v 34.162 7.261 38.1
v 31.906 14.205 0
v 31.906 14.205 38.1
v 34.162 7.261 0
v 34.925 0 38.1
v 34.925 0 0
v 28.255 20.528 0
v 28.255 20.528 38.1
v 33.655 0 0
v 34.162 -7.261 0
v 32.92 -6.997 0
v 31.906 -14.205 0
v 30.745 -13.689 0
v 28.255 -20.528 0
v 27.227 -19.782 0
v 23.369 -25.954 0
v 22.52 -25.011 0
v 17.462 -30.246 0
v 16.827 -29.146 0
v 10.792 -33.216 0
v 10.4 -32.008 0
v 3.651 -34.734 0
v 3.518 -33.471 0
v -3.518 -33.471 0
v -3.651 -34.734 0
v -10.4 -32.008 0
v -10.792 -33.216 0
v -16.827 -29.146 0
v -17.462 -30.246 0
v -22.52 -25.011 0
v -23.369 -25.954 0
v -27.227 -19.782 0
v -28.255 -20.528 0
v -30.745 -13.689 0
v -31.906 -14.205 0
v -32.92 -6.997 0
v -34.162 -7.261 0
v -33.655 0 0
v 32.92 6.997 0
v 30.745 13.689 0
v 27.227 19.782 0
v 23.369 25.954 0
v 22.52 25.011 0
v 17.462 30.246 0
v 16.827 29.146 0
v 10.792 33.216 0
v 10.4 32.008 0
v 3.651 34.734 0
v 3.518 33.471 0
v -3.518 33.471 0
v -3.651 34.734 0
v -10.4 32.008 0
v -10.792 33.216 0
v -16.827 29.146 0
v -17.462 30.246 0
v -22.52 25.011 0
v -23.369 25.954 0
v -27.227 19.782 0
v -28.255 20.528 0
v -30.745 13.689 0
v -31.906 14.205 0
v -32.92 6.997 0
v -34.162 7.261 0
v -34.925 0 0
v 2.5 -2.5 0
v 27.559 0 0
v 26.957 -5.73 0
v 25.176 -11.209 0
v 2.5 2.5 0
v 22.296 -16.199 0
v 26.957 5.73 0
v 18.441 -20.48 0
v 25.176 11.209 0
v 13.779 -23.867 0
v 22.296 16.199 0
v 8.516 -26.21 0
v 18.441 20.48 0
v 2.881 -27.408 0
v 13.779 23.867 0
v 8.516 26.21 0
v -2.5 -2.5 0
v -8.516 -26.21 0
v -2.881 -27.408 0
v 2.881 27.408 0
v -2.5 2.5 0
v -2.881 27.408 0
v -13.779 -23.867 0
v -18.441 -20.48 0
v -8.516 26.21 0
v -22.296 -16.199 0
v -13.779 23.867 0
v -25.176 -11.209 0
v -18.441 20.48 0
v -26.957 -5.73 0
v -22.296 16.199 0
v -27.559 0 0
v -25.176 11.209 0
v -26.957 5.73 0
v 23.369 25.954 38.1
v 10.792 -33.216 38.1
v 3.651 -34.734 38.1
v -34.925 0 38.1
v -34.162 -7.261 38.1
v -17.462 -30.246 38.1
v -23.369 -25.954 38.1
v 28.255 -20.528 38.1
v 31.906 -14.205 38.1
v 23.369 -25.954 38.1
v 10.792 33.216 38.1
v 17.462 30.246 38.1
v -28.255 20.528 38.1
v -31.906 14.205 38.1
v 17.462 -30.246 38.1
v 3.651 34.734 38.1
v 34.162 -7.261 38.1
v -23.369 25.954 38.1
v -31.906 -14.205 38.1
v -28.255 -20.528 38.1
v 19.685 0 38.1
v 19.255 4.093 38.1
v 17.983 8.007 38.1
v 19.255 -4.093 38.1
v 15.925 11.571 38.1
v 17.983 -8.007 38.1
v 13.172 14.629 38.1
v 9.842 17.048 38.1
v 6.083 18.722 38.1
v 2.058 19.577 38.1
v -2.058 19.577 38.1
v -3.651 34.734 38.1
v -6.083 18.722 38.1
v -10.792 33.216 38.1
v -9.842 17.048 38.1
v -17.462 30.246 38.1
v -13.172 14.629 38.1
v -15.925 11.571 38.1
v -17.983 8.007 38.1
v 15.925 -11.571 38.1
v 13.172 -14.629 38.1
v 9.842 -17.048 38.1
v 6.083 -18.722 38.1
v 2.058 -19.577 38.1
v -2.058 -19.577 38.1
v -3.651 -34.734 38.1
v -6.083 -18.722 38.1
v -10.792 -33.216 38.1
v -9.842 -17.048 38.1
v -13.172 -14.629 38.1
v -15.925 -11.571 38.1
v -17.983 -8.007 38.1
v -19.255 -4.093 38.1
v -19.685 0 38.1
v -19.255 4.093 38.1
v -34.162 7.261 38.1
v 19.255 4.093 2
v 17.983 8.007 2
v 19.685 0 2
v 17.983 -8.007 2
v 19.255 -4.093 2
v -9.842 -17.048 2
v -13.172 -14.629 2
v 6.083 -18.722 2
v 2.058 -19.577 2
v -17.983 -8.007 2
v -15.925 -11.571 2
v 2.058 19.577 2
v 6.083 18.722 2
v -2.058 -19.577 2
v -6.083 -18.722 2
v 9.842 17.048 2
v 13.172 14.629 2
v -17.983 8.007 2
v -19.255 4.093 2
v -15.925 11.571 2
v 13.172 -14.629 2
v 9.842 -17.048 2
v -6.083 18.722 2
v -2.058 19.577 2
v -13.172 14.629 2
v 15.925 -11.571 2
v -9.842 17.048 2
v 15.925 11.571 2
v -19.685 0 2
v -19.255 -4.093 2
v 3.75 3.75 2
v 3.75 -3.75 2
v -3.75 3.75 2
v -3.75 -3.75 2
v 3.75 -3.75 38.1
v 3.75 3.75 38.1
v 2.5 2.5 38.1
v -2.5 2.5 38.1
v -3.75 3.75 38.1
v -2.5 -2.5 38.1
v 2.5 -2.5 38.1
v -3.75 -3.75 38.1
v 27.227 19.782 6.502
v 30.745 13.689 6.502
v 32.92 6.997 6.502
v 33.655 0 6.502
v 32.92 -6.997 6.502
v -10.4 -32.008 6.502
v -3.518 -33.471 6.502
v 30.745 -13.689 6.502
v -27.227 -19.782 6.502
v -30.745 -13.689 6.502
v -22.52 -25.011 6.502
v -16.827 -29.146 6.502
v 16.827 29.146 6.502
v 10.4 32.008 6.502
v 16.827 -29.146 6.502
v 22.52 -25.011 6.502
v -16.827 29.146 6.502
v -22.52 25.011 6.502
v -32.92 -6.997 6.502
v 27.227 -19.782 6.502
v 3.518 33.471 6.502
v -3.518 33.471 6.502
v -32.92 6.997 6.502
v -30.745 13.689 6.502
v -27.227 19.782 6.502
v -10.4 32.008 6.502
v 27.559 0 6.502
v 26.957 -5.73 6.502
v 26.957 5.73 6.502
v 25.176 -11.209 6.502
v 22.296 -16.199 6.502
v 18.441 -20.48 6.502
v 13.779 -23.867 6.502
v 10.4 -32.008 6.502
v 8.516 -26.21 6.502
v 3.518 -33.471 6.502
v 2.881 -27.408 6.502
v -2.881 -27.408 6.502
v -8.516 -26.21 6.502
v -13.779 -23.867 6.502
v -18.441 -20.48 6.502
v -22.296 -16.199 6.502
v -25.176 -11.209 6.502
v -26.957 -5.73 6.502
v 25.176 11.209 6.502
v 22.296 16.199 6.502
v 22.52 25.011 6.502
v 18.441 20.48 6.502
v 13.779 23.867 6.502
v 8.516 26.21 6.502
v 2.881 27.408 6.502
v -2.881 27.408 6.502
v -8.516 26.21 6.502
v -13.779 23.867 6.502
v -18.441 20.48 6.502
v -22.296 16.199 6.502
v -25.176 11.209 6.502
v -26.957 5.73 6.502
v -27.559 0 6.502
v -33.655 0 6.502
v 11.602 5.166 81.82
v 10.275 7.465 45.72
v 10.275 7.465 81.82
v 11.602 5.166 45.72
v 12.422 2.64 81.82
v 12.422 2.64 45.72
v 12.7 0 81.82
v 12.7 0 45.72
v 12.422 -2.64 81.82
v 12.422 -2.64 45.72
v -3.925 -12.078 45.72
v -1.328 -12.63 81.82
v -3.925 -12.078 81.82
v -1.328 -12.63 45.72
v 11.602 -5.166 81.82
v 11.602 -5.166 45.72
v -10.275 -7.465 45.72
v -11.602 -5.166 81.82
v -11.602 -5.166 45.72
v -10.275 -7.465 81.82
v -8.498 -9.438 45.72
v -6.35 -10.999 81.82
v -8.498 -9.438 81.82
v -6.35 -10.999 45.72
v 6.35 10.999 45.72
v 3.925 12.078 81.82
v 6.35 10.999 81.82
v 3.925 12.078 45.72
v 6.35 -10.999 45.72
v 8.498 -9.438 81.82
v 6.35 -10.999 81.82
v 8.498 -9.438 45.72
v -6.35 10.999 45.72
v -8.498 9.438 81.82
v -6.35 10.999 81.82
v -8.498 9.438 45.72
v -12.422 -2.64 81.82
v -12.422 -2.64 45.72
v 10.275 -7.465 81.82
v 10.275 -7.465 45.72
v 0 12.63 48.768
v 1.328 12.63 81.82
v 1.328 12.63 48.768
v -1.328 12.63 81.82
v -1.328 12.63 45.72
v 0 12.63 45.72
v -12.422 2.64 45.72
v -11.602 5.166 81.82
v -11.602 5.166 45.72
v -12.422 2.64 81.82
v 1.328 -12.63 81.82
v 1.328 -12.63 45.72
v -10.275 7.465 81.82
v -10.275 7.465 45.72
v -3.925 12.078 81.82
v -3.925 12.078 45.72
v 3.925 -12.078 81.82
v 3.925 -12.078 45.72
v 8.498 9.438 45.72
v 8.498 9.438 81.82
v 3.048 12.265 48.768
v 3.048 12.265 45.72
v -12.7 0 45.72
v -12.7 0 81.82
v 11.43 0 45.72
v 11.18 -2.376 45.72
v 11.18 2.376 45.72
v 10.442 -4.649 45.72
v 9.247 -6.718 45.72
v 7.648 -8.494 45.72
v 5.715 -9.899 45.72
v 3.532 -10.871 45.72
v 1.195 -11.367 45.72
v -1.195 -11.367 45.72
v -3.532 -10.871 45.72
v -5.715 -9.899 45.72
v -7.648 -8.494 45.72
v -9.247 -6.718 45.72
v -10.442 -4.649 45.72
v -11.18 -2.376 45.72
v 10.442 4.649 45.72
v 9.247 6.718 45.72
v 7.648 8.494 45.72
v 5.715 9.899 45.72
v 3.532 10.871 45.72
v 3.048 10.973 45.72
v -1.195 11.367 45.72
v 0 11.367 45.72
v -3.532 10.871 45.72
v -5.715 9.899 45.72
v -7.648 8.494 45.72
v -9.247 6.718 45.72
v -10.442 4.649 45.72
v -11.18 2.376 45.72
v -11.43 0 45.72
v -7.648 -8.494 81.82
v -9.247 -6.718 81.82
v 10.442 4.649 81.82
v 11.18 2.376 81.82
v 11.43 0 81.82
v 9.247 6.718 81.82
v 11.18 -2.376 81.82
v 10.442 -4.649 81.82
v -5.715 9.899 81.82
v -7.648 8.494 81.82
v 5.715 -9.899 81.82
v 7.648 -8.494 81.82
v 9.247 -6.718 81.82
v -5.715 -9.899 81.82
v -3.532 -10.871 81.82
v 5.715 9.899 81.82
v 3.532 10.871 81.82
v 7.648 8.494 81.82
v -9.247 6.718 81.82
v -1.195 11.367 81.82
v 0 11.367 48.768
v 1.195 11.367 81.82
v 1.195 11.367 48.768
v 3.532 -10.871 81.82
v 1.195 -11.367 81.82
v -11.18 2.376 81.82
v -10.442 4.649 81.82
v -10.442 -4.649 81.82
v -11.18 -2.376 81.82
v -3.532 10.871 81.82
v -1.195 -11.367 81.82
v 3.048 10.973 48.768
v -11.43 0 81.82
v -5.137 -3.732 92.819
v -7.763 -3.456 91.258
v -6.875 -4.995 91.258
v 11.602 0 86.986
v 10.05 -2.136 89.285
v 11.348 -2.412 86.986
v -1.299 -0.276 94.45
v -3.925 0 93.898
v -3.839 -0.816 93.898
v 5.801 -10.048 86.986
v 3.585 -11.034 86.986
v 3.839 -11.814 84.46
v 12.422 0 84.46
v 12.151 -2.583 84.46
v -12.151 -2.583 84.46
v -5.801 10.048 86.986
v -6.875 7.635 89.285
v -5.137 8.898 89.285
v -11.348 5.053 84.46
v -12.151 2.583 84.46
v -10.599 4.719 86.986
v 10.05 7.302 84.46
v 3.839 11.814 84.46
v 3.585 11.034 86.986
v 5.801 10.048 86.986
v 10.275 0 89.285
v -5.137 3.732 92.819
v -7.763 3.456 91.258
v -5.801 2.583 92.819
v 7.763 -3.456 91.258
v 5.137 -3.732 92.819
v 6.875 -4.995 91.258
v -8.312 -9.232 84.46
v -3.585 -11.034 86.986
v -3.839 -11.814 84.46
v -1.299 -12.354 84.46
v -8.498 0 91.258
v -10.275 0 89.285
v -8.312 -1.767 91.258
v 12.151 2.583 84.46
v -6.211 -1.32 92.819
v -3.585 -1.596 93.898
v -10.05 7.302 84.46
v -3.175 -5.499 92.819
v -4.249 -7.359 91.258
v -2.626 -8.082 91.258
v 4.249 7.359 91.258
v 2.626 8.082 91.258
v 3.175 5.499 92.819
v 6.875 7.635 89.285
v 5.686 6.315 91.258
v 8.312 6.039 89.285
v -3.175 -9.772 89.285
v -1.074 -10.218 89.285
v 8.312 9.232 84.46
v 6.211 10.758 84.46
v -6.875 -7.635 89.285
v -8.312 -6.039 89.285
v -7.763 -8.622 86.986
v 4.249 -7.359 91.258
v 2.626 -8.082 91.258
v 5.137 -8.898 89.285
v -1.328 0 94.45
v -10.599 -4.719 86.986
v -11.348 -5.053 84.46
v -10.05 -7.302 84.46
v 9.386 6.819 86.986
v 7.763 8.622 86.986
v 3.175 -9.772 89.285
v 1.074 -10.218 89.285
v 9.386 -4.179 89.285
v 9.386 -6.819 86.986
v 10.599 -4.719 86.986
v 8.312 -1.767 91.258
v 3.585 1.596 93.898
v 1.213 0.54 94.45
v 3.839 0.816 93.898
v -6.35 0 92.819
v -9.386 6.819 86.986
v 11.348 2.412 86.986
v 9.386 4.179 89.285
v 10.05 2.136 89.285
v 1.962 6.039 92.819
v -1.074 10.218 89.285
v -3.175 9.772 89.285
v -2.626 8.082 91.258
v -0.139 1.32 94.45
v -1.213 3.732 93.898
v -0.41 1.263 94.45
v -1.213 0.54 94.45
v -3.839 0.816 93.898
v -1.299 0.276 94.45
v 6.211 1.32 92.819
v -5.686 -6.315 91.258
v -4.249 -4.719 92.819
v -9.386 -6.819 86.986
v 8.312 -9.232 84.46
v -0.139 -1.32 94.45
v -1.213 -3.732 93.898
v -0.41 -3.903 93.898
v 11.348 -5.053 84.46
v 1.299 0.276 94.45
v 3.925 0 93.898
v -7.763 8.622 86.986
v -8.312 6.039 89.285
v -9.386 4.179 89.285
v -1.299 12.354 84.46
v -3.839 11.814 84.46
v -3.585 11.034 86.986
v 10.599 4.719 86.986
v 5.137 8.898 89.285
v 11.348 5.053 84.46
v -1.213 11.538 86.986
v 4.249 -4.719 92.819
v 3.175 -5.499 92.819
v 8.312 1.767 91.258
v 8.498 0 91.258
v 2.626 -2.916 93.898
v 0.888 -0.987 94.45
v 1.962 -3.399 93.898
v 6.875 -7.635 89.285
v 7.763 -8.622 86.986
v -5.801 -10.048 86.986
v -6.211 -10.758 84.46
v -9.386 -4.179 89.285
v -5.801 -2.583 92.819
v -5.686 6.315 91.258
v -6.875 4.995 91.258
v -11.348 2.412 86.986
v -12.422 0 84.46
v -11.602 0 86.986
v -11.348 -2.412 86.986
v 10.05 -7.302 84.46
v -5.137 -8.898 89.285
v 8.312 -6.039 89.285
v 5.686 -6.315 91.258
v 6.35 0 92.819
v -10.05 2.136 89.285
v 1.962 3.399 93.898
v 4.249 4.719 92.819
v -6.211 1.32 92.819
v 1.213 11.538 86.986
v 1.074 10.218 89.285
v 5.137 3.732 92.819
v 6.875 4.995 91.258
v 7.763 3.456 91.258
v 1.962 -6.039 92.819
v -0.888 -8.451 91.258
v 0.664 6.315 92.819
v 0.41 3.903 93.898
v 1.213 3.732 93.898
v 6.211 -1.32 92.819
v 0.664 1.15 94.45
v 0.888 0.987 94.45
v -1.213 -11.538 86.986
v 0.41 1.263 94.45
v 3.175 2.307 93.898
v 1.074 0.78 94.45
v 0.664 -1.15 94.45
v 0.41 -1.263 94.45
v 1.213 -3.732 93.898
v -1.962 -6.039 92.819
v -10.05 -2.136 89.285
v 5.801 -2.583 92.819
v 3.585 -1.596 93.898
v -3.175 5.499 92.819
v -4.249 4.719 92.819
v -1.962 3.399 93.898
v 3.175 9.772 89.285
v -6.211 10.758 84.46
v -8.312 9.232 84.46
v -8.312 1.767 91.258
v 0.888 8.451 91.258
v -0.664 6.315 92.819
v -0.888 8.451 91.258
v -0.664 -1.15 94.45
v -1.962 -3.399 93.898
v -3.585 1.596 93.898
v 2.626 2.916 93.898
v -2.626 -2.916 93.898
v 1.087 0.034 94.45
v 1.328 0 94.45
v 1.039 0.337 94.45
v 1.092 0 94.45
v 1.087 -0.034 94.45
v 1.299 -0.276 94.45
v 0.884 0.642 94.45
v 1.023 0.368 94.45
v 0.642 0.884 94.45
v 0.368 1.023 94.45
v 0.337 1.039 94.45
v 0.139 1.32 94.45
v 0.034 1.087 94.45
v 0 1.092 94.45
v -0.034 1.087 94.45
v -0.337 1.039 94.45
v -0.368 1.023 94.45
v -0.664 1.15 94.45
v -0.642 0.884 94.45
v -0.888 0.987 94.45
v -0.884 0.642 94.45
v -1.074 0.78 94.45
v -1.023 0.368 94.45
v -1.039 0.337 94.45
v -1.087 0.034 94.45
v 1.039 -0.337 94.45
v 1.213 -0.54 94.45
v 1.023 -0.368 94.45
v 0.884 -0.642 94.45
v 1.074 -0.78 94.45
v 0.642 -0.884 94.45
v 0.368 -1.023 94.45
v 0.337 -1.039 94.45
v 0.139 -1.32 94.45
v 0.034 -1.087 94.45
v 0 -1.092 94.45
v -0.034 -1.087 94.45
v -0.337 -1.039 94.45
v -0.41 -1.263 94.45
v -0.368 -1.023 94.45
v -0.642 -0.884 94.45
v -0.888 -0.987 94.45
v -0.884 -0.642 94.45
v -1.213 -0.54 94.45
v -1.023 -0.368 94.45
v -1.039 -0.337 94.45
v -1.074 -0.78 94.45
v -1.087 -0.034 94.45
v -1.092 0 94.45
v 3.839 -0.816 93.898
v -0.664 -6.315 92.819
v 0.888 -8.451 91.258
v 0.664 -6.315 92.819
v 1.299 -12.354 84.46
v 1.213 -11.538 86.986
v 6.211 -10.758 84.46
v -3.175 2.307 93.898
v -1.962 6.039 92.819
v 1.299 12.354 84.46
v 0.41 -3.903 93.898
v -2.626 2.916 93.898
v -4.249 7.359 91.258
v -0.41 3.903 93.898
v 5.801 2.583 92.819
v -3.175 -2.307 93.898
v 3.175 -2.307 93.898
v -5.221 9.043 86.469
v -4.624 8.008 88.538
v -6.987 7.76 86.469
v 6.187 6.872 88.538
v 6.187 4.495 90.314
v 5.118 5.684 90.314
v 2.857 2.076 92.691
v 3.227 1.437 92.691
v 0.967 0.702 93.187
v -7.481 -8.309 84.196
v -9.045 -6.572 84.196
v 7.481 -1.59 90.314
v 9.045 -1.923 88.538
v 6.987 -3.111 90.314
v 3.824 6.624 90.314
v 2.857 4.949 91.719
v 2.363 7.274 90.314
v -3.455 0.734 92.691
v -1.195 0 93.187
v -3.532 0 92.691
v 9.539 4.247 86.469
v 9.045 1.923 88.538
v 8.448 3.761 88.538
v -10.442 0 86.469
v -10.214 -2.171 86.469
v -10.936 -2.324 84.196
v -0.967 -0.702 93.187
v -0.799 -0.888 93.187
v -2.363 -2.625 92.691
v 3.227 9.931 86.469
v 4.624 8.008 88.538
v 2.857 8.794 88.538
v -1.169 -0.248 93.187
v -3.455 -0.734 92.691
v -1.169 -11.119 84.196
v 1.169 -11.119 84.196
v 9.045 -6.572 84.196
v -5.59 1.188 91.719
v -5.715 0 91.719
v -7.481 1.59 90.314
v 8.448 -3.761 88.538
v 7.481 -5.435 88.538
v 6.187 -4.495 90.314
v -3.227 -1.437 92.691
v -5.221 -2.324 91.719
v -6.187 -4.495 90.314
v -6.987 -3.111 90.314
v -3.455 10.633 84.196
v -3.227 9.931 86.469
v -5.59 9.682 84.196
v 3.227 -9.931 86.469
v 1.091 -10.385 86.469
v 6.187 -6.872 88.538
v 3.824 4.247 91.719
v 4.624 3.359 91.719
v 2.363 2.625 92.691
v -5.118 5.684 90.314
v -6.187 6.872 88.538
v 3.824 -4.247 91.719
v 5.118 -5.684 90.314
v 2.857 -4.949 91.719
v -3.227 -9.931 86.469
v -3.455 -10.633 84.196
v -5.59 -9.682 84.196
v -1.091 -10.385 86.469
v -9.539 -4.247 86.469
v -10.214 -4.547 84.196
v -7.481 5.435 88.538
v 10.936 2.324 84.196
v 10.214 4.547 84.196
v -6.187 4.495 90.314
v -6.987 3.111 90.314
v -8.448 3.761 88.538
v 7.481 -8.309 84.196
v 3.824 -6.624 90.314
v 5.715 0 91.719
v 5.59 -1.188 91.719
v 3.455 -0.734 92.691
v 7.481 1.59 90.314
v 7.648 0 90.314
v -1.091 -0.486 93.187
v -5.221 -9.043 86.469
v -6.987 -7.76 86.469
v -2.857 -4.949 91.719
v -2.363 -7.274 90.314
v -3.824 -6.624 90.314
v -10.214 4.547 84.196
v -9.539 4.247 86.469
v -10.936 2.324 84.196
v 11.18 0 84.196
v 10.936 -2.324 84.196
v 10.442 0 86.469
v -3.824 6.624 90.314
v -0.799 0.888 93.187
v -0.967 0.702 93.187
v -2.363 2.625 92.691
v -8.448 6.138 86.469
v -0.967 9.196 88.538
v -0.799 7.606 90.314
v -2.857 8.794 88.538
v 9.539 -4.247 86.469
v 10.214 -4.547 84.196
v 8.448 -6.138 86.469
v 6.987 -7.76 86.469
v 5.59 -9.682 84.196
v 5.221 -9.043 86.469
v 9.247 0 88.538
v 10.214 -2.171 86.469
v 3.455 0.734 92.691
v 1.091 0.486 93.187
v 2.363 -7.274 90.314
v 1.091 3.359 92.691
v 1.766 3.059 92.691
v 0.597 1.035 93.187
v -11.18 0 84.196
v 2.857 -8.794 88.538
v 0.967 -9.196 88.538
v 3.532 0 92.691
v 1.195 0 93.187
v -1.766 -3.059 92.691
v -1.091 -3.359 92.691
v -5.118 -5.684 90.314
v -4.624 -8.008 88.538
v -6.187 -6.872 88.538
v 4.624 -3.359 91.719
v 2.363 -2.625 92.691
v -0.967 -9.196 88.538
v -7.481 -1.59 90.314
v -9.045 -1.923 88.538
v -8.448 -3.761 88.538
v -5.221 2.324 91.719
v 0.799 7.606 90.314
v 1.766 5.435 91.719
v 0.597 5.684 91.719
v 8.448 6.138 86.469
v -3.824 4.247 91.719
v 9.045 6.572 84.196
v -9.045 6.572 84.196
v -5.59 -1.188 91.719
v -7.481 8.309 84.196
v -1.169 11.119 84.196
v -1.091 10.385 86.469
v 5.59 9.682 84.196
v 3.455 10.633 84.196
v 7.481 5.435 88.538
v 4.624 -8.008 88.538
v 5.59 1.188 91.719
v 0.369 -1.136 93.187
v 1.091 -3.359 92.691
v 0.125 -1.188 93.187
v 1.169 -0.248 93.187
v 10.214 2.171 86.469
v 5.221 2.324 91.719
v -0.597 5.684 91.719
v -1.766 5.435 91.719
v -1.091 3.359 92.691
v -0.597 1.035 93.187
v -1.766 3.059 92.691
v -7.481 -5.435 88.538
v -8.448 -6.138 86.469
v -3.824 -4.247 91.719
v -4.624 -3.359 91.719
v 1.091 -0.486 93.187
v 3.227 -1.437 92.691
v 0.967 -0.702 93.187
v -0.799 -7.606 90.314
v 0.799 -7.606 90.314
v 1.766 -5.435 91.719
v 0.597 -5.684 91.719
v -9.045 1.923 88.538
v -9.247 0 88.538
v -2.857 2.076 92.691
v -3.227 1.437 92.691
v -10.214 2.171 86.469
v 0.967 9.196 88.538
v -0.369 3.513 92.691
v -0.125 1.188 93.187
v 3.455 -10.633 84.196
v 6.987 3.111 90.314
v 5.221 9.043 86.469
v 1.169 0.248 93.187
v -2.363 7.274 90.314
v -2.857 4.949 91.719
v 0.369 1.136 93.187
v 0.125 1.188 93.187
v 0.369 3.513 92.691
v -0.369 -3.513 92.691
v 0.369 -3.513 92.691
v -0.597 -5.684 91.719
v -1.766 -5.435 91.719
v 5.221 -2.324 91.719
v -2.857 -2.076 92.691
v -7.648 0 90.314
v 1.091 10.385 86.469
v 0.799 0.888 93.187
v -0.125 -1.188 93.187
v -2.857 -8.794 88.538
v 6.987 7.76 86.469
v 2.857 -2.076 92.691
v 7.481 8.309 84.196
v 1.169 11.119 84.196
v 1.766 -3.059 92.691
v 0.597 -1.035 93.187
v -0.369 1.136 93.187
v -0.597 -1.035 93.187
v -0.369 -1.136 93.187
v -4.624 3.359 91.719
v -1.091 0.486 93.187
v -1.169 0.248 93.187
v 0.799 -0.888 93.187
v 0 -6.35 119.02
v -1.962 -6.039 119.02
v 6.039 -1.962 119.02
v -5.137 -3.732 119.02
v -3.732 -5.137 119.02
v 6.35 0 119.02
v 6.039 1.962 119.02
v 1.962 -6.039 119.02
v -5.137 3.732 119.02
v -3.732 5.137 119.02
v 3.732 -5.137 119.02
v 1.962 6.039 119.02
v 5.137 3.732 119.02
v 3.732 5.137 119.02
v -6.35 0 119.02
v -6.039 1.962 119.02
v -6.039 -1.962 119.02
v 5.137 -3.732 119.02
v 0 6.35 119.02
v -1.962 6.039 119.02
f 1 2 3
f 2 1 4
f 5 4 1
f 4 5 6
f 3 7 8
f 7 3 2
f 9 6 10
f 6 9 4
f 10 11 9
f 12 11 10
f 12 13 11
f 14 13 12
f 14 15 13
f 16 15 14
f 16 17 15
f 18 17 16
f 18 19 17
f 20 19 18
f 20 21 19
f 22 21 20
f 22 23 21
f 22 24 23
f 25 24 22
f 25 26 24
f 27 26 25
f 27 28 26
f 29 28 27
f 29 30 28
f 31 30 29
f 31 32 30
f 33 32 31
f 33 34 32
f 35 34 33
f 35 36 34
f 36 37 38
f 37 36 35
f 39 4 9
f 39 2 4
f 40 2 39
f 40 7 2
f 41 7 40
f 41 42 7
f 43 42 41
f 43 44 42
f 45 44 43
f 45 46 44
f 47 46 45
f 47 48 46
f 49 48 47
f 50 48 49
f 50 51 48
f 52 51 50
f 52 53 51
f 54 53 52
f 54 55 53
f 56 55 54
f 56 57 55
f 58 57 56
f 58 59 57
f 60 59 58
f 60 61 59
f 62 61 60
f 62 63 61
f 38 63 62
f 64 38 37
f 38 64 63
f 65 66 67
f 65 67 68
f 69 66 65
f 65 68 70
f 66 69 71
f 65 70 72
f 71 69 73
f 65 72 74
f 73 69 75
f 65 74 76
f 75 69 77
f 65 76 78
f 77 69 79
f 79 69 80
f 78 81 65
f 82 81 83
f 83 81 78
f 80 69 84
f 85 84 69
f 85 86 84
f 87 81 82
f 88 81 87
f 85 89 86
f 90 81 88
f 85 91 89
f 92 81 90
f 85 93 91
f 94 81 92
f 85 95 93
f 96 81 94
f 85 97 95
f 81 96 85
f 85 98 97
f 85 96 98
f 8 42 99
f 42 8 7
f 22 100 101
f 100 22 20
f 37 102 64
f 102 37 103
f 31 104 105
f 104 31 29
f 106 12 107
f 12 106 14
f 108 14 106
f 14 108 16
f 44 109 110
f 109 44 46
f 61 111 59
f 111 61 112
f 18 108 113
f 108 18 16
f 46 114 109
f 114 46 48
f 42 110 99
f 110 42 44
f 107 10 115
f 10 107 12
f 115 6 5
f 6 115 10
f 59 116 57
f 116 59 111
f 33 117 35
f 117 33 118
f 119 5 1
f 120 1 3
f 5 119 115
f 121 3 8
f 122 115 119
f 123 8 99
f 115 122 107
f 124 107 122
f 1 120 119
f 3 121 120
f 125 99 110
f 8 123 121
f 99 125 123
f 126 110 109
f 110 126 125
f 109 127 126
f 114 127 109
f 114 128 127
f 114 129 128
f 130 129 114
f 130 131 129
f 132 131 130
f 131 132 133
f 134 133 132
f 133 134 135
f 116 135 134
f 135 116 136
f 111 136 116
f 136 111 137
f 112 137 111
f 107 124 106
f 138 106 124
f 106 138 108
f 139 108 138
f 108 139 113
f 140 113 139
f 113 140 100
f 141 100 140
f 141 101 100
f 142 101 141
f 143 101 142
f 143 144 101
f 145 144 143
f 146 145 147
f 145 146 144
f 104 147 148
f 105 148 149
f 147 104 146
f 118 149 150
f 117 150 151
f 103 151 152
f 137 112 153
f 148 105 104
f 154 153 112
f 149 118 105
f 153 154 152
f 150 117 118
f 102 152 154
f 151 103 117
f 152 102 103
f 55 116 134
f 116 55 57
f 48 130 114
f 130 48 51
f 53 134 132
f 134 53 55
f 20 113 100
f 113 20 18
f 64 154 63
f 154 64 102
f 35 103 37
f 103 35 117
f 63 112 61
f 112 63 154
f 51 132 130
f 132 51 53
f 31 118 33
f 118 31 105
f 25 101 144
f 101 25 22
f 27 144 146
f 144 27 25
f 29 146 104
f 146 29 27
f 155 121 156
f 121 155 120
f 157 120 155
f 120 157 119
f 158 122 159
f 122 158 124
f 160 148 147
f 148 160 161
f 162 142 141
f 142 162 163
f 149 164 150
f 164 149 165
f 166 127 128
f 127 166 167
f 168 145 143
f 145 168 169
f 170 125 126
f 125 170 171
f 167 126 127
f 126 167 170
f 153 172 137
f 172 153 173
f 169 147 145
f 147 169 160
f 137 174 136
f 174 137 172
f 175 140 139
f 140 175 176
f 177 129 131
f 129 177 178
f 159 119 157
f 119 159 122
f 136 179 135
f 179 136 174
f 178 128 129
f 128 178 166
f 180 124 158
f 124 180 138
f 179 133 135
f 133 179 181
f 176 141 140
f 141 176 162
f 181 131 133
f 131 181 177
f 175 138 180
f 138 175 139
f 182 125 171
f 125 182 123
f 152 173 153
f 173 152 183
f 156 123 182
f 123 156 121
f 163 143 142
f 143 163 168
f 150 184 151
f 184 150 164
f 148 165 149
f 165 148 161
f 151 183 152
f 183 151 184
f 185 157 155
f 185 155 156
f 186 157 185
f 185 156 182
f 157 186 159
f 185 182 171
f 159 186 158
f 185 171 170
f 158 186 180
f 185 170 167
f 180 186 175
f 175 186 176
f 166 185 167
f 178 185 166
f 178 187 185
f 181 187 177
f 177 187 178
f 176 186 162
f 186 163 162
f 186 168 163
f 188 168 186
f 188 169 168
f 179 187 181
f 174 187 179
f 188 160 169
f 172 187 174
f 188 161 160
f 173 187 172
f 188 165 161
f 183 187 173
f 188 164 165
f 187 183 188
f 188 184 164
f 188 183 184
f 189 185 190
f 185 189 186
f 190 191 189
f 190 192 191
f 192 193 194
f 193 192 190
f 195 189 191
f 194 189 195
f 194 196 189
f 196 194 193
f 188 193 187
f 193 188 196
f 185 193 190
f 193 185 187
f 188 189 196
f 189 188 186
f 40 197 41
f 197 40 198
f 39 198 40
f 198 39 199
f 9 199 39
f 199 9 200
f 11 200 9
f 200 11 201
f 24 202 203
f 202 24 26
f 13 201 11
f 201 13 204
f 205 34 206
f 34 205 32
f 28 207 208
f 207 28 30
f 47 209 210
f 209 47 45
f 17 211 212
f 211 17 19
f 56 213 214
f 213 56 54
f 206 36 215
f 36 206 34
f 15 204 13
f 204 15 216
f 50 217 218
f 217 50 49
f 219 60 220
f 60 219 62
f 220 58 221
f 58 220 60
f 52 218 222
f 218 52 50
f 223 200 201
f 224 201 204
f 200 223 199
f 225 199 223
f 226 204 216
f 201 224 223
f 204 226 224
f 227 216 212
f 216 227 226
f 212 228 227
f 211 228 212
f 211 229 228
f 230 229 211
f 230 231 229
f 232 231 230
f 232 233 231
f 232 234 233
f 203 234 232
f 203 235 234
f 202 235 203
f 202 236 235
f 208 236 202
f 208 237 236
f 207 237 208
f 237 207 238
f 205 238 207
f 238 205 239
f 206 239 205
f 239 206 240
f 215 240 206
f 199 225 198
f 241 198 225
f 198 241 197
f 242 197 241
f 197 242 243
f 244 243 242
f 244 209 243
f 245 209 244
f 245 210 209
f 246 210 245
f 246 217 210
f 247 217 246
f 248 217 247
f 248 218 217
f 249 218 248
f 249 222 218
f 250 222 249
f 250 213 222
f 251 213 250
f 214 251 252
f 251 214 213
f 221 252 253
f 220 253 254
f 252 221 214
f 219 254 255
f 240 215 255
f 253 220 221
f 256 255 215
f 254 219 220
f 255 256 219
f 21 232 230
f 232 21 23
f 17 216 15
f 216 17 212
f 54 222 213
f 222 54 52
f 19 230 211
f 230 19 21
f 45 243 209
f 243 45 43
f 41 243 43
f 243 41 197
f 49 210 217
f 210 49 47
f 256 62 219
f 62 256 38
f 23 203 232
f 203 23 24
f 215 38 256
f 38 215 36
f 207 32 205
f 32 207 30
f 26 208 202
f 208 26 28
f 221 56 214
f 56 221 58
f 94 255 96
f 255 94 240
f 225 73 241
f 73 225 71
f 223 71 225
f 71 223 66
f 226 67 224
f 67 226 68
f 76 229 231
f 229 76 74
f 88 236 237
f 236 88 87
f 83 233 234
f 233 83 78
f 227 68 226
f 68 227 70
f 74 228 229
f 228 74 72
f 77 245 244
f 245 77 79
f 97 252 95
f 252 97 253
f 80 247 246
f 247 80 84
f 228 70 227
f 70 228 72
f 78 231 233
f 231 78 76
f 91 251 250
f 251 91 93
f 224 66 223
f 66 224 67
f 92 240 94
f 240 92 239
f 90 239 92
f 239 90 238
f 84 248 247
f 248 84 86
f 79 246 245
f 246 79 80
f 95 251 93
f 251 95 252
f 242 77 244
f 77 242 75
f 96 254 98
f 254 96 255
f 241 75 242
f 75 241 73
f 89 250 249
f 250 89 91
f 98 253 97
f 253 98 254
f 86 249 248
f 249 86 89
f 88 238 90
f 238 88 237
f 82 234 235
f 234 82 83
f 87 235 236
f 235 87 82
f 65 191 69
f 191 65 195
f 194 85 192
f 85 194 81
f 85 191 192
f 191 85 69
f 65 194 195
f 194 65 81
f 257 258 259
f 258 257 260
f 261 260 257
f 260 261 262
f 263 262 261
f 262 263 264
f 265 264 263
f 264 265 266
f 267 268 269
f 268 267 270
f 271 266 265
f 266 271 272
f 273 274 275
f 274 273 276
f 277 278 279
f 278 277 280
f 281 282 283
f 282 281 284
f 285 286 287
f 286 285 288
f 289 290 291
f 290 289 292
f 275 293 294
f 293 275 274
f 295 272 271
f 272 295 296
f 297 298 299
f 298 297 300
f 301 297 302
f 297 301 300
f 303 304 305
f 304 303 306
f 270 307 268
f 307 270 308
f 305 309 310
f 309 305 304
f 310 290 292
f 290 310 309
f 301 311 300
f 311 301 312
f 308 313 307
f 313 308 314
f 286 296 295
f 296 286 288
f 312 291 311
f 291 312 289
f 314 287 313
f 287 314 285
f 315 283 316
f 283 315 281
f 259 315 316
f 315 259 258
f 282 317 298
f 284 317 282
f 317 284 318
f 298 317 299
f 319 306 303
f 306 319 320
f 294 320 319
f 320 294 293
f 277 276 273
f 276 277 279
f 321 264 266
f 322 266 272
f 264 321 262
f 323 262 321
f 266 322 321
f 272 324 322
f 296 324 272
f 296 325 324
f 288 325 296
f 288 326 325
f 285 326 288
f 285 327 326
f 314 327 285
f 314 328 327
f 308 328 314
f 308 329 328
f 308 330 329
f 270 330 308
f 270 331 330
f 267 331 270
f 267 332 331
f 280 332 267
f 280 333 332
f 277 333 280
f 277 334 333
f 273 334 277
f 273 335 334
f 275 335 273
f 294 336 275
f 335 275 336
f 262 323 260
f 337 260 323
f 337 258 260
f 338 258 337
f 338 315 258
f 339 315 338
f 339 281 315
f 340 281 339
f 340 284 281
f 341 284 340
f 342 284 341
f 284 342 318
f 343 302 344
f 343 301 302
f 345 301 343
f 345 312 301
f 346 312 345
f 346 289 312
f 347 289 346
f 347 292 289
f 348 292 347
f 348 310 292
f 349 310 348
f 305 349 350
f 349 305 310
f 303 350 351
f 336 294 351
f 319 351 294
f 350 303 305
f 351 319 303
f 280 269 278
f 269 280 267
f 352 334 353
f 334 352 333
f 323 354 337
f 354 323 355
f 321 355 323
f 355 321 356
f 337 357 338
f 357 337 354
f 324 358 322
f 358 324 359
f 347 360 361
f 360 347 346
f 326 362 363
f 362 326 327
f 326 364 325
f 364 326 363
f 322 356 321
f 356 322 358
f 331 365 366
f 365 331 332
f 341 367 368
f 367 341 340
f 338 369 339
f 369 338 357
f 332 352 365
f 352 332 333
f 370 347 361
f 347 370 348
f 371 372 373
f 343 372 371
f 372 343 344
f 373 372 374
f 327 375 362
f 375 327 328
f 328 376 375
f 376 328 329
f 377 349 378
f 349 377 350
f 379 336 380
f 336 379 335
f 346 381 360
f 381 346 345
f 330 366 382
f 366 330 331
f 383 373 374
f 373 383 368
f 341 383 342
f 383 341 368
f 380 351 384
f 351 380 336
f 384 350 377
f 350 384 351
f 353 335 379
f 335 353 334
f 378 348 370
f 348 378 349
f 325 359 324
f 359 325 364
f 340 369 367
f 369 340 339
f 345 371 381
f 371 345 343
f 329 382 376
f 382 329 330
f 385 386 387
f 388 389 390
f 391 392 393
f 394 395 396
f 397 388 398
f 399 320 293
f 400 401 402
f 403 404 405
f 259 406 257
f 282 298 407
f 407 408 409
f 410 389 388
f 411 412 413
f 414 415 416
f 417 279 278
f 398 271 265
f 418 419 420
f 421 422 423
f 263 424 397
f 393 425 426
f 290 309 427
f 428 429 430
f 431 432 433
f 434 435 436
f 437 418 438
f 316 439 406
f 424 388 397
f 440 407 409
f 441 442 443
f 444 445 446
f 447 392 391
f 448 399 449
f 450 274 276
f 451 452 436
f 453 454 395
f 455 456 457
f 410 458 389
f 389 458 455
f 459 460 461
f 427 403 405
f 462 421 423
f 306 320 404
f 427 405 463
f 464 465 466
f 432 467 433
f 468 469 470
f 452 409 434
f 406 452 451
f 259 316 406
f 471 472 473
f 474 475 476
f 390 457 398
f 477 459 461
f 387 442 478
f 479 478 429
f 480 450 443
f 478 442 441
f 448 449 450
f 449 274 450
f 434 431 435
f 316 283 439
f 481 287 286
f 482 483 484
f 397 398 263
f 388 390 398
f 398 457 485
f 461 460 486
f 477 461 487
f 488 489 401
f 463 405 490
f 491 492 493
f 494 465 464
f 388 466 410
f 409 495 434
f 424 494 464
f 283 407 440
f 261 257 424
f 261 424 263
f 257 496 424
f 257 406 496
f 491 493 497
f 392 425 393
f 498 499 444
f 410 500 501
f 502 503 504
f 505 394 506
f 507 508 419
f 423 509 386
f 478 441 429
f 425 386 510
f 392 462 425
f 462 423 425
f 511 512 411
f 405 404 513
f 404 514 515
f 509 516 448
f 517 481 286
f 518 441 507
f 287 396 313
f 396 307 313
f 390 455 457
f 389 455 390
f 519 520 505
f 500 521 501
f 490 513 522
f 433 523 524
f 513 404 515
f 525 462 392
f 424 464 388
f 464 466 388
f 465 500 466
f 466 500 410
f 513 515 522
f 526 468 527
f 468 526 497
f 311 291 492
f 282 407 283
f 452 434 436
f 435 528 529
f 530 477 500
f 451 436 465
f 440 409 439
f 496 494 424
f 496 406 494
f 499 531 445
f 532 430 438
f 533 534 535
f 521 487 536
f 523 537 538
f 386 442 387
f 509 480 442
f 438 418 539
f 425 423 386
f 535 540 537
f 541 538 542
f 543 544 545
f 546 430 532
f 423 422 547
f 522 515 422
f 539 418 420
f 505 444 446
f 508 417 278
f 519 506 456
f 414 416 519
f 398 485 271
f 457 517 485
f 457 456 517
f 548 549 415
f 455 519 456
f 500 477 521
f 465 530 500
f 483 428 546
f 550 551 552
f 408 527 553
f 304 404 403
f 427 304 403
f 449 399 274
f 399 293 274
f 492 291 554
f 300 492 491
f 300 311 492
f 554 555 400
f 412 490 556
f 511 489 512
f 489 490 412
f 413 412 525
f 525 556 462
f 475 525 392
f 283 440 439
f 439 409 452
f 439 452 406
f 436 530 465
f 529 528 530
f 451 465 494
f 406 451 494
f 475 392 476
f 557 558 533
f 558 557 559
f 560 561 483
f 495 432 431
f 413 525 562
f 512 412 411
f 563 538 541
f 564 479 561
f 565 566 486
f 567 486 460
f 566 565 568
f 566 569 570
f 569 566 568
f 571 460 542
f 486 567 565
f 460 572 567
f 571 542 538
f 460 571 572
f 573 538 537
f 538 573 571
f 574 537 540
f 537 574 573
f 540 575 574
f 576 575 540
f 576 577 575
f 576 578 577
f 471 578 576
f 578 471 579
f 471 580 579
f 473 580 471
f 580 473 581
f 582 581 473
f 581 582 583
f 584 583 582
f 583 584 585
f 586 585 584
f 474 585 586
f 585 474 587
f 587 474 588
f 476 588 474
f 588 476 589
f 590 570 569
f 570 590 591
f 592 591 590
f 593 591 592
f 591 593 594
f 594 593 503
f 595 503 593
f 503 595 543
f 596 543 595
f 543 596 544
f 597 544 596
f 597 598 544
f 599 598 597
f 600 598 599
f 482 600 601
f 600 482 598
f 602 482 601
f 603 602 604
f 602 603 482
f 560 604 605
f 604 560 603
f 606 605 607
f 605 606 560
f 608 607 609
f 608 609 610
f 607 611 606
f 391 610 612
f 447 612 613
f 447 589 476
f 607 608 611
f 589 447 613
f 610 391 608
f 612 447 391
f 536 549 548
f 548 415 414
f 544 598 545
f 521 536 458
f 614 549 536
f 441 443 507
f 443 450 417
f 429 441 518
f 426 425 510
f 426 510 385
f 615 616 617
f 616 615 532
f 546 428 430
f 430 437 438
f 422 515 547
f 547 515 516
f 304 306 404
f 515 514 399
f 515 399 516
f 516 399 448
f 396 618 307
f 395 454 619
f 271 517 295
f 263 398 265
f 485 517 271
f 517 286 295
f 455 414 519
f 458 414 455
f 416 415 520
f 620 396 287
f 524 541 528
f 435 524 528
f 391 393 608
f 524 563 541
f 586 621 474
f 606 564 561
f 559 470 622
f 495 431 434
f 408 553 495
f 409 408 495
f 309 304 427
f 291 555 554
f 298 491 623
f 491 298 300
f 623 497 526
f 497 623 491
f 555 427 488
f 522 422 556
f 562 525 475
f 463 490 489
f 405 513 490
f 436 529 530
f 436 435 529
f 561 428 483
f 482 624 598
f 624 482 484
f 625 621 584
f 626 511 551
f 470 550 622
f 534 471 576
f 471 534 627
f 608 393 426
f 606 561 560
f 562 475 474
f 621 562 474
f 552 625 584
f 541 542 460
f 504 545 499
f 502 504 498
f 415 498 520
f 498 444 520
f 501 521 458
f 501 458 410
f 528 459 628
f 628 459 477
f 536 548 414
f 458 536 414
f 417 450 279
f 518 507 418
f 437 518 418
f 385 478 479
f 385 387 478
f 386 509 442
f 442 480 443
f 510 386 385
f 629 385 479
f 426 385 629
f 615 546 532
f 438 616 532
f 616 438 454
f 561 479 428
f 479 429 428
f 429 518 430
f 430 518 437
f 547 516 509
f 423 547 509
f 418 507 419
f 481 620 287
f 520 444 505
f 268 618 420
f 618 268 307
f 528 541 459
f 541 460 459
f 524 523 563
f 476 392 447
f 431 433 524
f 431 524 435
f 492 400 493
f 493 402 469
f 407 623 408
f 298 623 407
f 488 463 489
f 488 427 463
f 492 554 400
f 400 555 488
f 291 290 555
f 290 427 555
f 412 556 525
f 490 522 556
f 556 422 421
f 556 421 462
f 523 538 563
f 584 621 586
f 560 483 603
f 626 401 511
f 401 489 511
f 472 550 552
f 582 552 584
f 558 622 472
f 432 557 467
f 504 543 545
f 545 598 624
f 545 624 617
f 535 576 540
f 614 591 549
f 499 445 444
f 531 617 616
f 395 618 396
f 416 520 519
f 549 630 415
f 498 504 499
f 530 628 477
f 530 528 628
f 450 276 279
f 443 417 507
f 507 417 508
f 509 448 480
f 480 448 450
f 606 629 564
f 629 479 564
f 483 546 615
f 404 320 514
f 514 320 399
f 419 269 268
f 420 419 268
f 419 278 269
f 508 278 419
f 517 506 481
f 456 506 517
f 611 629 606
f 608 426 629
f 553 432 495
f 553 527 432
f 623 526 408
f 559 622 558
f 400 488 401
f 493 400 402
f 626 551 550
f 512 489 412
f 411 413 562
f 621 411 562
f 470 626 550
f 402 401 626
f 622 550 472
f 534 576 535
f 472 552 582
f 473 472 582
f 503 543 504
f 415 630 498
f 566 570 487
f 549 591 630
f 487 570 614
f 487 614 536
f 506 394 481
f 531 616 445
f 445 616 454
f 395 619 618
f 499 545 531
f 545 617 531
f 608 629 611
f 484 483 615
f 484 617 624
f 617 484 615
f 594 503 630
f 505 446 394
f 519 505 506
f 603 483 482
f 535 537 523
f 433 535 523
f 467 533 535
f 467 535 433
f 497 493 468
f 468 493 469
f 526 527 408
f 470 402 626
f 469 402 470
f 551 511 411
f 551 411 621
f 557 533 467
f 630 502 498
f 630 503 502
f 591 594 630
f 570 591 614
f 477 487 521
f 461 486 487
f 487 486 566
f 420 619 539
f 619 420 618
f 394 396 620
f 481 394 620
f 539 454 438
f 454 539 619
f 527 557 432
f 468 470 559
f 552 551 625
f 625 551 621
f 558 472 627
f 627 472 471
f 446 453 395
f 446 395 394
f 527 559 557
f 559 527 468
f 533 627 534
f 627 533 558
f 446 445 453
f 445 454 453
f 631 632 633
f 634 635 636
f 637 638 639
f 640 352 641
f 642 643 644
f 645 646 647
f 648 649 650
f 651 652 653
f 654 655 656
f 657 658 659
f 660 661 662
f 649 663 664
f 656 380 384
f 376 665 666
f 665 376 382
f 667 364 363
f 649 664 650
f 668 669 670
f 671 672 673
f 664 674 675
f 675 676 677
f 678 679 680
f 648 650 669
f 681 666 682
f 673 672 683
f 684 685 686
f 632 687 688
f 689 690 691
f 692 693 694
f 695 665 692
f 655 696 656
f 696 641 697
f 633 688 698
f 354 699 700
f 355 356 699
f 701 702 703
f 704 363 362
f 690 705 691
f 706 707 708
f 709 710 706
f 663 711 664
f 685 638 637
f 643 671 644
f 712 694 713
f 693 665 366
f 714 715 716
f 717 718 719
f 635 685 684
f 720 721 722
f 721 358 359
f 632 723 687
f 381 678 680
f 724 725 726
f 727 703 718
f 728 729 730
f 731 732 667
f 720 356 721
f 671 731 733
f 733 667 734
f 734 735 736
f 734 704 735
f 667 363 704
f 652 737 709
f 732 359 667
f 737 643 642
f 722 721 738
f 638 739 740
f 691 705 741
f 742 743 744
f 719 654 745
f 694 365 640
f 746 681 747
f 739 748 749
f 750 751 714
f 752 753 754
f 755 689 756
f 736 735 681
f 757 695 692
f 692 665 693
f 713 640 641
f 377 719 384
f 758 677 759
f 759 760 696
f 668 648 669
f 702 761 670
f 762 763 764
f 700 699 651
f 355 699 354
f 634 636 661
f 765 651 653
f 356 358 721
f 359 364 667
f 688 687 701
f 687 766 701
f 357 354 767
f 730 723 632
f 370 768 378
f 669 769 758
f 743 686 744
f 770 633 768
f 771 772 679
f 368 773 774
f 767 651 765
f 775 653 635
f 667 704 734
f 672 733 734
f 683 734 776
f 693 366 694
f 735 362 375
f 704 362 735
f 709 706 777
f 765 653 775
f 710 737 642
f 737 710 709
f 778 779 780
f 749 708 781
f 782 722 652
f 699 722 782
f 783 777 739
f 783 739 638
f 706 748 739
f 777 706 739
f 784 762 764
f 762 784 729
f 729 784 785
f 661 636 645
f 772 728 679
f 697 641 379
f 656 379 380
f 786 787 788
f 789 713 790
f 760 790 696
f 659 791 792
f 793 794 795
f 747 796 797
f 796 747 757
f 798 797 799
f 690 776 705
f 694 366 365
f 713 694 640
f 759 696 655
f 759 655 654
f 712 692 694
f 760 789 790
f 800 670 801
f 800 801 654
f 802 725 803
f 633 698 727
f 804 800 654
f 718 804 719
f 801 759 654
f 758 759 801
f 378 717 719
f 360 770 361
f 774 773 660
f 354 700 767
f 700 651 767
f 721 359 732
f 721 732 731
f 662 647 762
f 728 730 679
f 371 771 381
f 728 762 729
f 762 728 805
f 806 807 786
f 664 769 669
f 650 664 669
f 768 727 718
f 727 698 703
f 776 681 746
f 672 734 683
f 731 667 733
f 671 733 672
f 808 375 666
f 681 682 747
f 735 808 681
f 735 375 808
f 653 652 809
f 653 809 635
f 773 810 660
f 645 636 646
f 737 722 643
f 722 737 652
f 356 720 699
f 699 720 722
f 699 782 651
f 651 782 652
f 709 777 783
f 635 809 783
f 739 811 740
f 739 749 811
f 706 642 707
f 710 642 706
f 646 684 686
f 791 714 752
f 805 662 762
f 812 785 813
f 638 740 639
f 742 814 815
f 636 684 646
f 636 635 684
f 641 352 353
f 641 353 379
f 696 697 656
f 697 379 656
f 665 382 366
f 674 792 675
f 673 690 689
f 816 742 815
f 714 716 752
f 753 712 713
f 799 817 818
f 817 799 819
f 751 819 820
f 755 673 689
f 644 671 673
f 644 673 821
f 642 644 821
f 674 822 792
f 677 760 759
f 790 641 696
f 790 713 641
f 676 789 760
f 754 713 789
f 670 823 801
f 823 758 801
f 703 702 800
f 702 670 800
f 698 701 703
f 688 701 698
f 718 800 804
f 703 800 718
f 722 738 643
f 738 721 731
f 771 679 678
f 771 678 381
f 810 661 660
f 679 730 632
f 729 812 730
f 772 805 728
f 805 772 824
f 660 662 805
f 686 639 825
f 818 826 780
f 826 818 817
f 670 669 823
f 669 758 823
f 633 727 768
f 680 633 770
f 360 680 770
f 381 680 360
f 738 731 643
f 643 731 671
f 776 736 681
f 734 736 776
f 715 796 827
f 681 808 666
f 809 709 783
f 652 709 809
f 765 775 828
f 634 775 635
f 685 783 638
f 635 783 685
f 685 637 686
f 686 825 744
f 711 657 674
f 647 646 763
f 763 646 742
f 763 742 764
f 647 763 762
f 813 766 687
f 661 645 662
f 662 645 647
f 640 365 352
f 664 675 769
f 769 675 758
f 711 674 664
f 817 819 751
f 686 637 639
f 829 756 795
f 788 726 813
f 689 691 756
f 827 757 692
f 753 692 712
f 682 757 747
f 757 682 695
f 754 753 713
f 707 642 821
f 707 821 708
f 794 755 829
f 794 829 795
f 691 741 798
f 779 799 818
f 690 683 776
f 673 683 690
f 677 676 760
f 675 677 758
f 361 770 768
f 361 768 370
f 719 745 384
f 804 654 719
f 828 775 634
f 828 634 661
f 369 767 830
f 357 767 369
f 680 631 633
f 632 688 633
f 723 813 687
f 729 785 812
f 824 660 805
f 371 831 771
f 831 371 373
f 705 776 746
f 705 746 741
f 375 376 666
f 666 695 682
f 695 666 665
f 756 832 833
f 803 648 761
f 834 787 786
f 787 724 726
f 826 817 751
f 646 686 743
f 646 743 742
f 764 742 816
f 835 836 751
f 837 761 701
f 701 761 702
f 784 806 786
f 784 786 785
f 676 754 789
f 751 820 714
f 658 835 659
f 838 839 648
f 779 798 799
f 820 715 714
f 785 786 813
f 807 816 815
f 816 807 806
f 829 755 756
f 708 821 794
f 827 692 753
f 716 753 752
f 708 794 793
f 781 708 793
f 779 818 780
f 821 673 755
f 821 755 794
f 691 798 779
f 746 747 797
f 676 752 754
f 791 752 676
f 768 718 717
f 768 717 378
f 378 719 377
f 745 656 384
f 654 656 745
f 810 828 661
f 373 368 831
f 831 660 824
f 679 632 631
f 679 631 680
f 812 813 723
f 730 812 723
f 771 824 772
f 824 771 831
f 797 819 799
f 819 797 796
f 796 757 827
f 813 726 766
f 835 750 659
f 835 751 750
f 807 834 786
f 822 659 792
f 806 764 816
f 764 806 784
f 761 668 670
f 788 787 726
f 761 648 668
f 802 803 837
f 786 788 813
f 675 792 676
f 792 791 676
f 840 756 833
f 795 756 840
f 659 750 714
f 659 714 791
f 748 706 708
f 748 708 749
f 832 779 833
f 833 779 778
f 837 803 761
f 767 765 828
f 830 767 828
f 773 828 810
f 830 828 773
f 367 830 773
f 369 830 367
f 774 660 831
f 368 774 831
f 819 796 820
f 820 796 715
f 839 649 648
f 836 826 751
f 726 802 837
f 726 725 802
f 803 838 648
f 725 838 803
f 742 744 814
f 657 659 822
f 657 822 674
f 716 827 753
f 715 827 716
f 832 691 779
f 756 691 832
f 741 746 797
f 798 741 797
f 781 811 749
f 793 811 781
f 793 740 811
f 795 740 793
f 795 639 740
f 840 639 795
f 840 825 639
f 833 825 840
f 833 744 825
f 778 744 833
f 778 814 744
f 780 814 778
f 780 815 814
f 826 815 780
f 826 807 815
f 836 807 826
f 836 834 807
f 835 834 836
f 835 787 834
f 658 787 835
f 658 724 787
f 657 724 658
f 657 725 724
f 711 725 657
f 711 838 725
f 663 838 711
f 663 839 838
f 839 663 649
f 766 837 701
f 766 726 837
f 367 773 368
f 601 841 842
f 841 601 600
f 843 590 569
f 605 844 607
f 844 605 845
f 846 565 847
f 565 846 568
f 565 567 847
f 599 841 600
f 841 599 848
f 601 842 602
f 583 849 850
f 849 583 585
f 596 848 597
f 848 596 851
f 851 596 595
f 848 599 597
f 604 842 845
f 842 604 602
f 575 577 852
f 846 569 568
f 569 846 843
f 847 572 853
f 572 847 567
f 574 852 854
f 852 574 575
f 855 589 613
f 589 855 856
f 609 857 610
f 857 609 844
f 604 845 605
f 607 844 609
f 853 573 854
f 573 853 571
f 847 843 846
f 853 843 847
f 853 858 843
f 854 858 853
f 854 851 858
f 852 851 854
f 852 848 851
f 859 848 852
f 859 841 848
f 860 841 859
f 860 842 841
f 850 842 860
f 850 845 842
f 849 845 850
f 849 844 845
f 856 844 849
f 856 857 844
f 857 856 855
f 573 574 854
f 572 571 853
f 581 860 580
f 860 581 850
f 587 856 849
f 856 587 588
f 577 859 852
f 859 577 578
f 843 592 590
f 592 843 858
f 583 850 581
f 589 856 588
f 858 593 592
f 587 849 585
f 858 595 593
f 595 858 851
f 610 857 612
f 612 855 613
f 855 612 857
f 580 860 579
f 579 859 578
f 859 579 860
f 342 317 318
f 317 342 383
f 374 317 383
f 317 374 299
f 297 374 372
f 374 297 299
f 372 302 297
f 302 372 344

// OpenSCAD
// file: shapes.scad
/*
 *  OpenSCAD Shapes Library (www.openscad.at)
 *  Copyright (C) 2009  Catarina Mota <clifford@clifford.at>
 *
 *  This program is free software; you can redistribute it and/or modify
 *  it under the terms of the GNU General Public License as published by
 *  the Free Software Foundation; either version 2 of the License, or
 *  (at your option) any later version.
 *
 *  This program is distributed in the hope that it will be useful,
 *  but WITHOUT ANY WARRANTY; without even the implied warranty of
 *  MERCHANTABILITY or FITNESS FOR A PARTICULAR PURPOSE.  See the
 *  GNU General Public License for more details.
 *
 *  You should have received a copy of the GNU General Public License
 *  along with this program; if not, write to the Free Software
 *  Foundation, Inc., 59 Temple Place, Suite 330, Boston, MA  02111-1307  USA
 *
*/


//box(width, height, depth);
//roundedBox(width, height, depth, factor);
//cone(height, radius);
//oval(width, height, depth);
//tube(height, radius, wall);
//ovalTube(width, height, depth, wall);
//hexagon(height, depth);
//octagon(height, depth);
//dodecagon(height, depth);
//hexagram(height, depth);
//rightTriangle(adjacent, opposite, depth);
//equiTriangle(side, depth);
//12ptStar(height, depth);

//----------------------

//roundedBox(120, 60, 3, 8);

//----------------------

module box(w,h,d) {
	scale ([w,h,d]) cube(1, true);
}

module roundedBox(w,h,d,f){
	difference(){
		box(w,h,d);
		translate([-w/2,h/2,0]) cube(w/(f/2),true);
		translate([w/2,h/2,0]) cube(w/(f/2),true);
		translate([-w/2,-h/2,0]) cube(w/(f/2),true);
		translate([w/2,-h/2,0]) cube(w/(f/2),true);
	}
	translate([-w/2+w/f,h/2-w/f,-d/2]) cylinder(d,w/f, w/f);
	translate([w/2-w/f,h/2-w/f,-d/2]) cylinder(d,w/f, w/f);
	translate([-w/2+w/f,-h/2+w/f,-d/2]) cylinder(d,w/f, w/f);
	translate([w/2-w/f,-h/2+w/f,-d/2]) cylinder(d,w/f, w/f);
}

module cone(height, radius) {
		cylinder(height, radius, 0);
}

module oval(w,h,d) {
	scale ([w/100, h/100, 1]) cylinder(d, 50, 50);
}

module tube(height, radius, wall) {
	difference(){
		cylinder(height, radius, radius);
		cylinder(height, radius-wall, radius-wall);
	}
}

module ovalTube(w,h,d,wall) {
	difference(){
		scale ([w/100, h/100, 1]) cylinder(d, 50, 50);
		scale ([w/100, h/100, 1]) cylinder(d, 50-wall, 50-wall);
	}
}

module hexagon(height, depth) {
	boxWidth=height/1.75;
		union(){
			box(boxWidth, height, depth);
			rotate([0,0,60]) box(boxWidth, height, depth);
			rotate([0,0,-60]) box(boxWidth, height, depth);
		}
}

module octagon(height, depth) {
	intersection(){
		box(height, height, depth);
		rotate([0,0,45]) box(height, height, depth);
	}
}

module dodecagon(height, depth) {
	intersection(){
		hexagon(height, depth);
		rotate([0,0,90]) hexagon(height, depth);
	}
}

module hexagram(height, depth) {
	boxWidth=height/1.75;
	intersection(){
		box(height, boxWidth, depth);
		rotate([0,0,60]) box(height, boxWidth, depth);
	}
	intersection(){
		box(height, boxWidth, depth);
		rotate([0,0,-60]) box(height, boxWidth, depth);
	}
	intersection(){
		rotate([0,0,60]) box(height, boxWidth, depth);
		rotate([0,0,-60]) box(height, boxWidth, depth);
	}
}

module rightTriangle(adjacent, opposite, depth) {
	difference(){
		translate([-adjacent/2,opposite/2,0]) box(adjacent, opposite, depth);
		translate([-adjacent,0,0]){
			rotate([0,0,atan(opposite/adjacent)]) dislocateBox(adjacent*2, opposite, depth);
		}
	}
}

module equiTriangle(side, depth) {
	difference(){
		translate([-side/2,side/2,0]) box(side, side, depth);
		rotate([0,0,30]) dislocateBox(side*2, side, depth);
		translate([-side,0,0]){
			rotate([0,0,60]) dislocateBox(side*2, side, depth);
		}
	}
}

module 12ptStar(height, depth) {
	starNum=3;
	starAngle=360/starNum;
	for (s=[1:starNum]){
		rotate([0, 0, s*starAngle]) box(height, height, depth);
	}
}

//-----------------------
//MOVES THE ROTATION AXIS OF A BOX FROM ITS CENTER TO THE BOTTOM LEFT CORNER
module dislocateBox(w,h,d){
	translate([w/2,h,0]){
		difference(){
			box(w, h*2, d+1);
			translate([-w,0,0]) box(w, h*2, d+1);
		}
	}
}
// main file
/*
This is for a "burper" that fits on top of the old style BALL canning jars. This can be
used for fermenting most anythng in small batches. It will prevent air from getting in when the middle ring is filled with water. The water must be above the notch in the top.
Thank you to Catarina Mota (yet again) for her shapes.scad file!!
*/
include <shapes.scad>

mm_per_inch = 25.4;
rim_height = 0.256*mm_per_inch;
cap_height = 1.5*mm_per_inch;
bottom_thickness = 2; //in millimiters
jar_outside_radius = (2.75*mm_per_inch)/2;
rim_outside_radius = (2.65*mm_per_inch)/2;
rim_thickness = 0.24*mm_per_inch;
inside_well_height = cap_height-bottom_thickness;
//inside_well_height = 0.4*mm_per_inch;
inside_well_radius = (2.25*mm_per_inch)/2;
inside_well_width = 0.85*mm_per_inch;
cap_radius = (1*mm_per_inch)/2;
cap_wall_thickness = jar_outside_radius-rim_outside_radius;
exhaust_width = 5;
wall_thickness = 0.6*mm_per_inch;

difference ()
	{
	union ()
		{
		tube(cap_height, jar_outside_radius, wall_thickness);
		cylinder (h = bottom_thickness,r = jar_outside_radius); //bottom
		translate ([0,0,cap_height/2]) cube (size=[exhaust_width*1.5,exhaust_width*1.5,cap_height],center=true); //exhaust tube outside
		}
	translate ([0,0,cap_height/2]) cube (size=[exhaust_width,exhaust_width,cap_height],center=true); //exhaust tube
	tube(rim_height, rim_outside_radius, rim_thickness); //rim for jar
	}

//cap is here
translate ([0,0,cap_height*1.2]) difference ()
	{
	union ()
		{
		tube (inside_well_height, cap_radius, cap_wall_thickness);
		difference ()
			{
			translate ([0,0,inside_well_height]) sphere (r=cap_radius);
			translate ([0,0,inside_well_height]) sphere (r=cap_radius-cap_wall_thickness);
			translate ([0,0,-(inside_well_height*2.5)]) cylinder (h=inside_well_height*3.5, r=cap_radius);
			}
		translate ([0,0,inside_well_height+cap_radius-0.5]) cylinder (h=25, r1=1,r2=cap_radius/2); //handle
		}
	translate ([0,cap_radius/2,0]) cube ([rim_thickness / 2,rim_thickness*2,rim_thickness / 2]);
	}
